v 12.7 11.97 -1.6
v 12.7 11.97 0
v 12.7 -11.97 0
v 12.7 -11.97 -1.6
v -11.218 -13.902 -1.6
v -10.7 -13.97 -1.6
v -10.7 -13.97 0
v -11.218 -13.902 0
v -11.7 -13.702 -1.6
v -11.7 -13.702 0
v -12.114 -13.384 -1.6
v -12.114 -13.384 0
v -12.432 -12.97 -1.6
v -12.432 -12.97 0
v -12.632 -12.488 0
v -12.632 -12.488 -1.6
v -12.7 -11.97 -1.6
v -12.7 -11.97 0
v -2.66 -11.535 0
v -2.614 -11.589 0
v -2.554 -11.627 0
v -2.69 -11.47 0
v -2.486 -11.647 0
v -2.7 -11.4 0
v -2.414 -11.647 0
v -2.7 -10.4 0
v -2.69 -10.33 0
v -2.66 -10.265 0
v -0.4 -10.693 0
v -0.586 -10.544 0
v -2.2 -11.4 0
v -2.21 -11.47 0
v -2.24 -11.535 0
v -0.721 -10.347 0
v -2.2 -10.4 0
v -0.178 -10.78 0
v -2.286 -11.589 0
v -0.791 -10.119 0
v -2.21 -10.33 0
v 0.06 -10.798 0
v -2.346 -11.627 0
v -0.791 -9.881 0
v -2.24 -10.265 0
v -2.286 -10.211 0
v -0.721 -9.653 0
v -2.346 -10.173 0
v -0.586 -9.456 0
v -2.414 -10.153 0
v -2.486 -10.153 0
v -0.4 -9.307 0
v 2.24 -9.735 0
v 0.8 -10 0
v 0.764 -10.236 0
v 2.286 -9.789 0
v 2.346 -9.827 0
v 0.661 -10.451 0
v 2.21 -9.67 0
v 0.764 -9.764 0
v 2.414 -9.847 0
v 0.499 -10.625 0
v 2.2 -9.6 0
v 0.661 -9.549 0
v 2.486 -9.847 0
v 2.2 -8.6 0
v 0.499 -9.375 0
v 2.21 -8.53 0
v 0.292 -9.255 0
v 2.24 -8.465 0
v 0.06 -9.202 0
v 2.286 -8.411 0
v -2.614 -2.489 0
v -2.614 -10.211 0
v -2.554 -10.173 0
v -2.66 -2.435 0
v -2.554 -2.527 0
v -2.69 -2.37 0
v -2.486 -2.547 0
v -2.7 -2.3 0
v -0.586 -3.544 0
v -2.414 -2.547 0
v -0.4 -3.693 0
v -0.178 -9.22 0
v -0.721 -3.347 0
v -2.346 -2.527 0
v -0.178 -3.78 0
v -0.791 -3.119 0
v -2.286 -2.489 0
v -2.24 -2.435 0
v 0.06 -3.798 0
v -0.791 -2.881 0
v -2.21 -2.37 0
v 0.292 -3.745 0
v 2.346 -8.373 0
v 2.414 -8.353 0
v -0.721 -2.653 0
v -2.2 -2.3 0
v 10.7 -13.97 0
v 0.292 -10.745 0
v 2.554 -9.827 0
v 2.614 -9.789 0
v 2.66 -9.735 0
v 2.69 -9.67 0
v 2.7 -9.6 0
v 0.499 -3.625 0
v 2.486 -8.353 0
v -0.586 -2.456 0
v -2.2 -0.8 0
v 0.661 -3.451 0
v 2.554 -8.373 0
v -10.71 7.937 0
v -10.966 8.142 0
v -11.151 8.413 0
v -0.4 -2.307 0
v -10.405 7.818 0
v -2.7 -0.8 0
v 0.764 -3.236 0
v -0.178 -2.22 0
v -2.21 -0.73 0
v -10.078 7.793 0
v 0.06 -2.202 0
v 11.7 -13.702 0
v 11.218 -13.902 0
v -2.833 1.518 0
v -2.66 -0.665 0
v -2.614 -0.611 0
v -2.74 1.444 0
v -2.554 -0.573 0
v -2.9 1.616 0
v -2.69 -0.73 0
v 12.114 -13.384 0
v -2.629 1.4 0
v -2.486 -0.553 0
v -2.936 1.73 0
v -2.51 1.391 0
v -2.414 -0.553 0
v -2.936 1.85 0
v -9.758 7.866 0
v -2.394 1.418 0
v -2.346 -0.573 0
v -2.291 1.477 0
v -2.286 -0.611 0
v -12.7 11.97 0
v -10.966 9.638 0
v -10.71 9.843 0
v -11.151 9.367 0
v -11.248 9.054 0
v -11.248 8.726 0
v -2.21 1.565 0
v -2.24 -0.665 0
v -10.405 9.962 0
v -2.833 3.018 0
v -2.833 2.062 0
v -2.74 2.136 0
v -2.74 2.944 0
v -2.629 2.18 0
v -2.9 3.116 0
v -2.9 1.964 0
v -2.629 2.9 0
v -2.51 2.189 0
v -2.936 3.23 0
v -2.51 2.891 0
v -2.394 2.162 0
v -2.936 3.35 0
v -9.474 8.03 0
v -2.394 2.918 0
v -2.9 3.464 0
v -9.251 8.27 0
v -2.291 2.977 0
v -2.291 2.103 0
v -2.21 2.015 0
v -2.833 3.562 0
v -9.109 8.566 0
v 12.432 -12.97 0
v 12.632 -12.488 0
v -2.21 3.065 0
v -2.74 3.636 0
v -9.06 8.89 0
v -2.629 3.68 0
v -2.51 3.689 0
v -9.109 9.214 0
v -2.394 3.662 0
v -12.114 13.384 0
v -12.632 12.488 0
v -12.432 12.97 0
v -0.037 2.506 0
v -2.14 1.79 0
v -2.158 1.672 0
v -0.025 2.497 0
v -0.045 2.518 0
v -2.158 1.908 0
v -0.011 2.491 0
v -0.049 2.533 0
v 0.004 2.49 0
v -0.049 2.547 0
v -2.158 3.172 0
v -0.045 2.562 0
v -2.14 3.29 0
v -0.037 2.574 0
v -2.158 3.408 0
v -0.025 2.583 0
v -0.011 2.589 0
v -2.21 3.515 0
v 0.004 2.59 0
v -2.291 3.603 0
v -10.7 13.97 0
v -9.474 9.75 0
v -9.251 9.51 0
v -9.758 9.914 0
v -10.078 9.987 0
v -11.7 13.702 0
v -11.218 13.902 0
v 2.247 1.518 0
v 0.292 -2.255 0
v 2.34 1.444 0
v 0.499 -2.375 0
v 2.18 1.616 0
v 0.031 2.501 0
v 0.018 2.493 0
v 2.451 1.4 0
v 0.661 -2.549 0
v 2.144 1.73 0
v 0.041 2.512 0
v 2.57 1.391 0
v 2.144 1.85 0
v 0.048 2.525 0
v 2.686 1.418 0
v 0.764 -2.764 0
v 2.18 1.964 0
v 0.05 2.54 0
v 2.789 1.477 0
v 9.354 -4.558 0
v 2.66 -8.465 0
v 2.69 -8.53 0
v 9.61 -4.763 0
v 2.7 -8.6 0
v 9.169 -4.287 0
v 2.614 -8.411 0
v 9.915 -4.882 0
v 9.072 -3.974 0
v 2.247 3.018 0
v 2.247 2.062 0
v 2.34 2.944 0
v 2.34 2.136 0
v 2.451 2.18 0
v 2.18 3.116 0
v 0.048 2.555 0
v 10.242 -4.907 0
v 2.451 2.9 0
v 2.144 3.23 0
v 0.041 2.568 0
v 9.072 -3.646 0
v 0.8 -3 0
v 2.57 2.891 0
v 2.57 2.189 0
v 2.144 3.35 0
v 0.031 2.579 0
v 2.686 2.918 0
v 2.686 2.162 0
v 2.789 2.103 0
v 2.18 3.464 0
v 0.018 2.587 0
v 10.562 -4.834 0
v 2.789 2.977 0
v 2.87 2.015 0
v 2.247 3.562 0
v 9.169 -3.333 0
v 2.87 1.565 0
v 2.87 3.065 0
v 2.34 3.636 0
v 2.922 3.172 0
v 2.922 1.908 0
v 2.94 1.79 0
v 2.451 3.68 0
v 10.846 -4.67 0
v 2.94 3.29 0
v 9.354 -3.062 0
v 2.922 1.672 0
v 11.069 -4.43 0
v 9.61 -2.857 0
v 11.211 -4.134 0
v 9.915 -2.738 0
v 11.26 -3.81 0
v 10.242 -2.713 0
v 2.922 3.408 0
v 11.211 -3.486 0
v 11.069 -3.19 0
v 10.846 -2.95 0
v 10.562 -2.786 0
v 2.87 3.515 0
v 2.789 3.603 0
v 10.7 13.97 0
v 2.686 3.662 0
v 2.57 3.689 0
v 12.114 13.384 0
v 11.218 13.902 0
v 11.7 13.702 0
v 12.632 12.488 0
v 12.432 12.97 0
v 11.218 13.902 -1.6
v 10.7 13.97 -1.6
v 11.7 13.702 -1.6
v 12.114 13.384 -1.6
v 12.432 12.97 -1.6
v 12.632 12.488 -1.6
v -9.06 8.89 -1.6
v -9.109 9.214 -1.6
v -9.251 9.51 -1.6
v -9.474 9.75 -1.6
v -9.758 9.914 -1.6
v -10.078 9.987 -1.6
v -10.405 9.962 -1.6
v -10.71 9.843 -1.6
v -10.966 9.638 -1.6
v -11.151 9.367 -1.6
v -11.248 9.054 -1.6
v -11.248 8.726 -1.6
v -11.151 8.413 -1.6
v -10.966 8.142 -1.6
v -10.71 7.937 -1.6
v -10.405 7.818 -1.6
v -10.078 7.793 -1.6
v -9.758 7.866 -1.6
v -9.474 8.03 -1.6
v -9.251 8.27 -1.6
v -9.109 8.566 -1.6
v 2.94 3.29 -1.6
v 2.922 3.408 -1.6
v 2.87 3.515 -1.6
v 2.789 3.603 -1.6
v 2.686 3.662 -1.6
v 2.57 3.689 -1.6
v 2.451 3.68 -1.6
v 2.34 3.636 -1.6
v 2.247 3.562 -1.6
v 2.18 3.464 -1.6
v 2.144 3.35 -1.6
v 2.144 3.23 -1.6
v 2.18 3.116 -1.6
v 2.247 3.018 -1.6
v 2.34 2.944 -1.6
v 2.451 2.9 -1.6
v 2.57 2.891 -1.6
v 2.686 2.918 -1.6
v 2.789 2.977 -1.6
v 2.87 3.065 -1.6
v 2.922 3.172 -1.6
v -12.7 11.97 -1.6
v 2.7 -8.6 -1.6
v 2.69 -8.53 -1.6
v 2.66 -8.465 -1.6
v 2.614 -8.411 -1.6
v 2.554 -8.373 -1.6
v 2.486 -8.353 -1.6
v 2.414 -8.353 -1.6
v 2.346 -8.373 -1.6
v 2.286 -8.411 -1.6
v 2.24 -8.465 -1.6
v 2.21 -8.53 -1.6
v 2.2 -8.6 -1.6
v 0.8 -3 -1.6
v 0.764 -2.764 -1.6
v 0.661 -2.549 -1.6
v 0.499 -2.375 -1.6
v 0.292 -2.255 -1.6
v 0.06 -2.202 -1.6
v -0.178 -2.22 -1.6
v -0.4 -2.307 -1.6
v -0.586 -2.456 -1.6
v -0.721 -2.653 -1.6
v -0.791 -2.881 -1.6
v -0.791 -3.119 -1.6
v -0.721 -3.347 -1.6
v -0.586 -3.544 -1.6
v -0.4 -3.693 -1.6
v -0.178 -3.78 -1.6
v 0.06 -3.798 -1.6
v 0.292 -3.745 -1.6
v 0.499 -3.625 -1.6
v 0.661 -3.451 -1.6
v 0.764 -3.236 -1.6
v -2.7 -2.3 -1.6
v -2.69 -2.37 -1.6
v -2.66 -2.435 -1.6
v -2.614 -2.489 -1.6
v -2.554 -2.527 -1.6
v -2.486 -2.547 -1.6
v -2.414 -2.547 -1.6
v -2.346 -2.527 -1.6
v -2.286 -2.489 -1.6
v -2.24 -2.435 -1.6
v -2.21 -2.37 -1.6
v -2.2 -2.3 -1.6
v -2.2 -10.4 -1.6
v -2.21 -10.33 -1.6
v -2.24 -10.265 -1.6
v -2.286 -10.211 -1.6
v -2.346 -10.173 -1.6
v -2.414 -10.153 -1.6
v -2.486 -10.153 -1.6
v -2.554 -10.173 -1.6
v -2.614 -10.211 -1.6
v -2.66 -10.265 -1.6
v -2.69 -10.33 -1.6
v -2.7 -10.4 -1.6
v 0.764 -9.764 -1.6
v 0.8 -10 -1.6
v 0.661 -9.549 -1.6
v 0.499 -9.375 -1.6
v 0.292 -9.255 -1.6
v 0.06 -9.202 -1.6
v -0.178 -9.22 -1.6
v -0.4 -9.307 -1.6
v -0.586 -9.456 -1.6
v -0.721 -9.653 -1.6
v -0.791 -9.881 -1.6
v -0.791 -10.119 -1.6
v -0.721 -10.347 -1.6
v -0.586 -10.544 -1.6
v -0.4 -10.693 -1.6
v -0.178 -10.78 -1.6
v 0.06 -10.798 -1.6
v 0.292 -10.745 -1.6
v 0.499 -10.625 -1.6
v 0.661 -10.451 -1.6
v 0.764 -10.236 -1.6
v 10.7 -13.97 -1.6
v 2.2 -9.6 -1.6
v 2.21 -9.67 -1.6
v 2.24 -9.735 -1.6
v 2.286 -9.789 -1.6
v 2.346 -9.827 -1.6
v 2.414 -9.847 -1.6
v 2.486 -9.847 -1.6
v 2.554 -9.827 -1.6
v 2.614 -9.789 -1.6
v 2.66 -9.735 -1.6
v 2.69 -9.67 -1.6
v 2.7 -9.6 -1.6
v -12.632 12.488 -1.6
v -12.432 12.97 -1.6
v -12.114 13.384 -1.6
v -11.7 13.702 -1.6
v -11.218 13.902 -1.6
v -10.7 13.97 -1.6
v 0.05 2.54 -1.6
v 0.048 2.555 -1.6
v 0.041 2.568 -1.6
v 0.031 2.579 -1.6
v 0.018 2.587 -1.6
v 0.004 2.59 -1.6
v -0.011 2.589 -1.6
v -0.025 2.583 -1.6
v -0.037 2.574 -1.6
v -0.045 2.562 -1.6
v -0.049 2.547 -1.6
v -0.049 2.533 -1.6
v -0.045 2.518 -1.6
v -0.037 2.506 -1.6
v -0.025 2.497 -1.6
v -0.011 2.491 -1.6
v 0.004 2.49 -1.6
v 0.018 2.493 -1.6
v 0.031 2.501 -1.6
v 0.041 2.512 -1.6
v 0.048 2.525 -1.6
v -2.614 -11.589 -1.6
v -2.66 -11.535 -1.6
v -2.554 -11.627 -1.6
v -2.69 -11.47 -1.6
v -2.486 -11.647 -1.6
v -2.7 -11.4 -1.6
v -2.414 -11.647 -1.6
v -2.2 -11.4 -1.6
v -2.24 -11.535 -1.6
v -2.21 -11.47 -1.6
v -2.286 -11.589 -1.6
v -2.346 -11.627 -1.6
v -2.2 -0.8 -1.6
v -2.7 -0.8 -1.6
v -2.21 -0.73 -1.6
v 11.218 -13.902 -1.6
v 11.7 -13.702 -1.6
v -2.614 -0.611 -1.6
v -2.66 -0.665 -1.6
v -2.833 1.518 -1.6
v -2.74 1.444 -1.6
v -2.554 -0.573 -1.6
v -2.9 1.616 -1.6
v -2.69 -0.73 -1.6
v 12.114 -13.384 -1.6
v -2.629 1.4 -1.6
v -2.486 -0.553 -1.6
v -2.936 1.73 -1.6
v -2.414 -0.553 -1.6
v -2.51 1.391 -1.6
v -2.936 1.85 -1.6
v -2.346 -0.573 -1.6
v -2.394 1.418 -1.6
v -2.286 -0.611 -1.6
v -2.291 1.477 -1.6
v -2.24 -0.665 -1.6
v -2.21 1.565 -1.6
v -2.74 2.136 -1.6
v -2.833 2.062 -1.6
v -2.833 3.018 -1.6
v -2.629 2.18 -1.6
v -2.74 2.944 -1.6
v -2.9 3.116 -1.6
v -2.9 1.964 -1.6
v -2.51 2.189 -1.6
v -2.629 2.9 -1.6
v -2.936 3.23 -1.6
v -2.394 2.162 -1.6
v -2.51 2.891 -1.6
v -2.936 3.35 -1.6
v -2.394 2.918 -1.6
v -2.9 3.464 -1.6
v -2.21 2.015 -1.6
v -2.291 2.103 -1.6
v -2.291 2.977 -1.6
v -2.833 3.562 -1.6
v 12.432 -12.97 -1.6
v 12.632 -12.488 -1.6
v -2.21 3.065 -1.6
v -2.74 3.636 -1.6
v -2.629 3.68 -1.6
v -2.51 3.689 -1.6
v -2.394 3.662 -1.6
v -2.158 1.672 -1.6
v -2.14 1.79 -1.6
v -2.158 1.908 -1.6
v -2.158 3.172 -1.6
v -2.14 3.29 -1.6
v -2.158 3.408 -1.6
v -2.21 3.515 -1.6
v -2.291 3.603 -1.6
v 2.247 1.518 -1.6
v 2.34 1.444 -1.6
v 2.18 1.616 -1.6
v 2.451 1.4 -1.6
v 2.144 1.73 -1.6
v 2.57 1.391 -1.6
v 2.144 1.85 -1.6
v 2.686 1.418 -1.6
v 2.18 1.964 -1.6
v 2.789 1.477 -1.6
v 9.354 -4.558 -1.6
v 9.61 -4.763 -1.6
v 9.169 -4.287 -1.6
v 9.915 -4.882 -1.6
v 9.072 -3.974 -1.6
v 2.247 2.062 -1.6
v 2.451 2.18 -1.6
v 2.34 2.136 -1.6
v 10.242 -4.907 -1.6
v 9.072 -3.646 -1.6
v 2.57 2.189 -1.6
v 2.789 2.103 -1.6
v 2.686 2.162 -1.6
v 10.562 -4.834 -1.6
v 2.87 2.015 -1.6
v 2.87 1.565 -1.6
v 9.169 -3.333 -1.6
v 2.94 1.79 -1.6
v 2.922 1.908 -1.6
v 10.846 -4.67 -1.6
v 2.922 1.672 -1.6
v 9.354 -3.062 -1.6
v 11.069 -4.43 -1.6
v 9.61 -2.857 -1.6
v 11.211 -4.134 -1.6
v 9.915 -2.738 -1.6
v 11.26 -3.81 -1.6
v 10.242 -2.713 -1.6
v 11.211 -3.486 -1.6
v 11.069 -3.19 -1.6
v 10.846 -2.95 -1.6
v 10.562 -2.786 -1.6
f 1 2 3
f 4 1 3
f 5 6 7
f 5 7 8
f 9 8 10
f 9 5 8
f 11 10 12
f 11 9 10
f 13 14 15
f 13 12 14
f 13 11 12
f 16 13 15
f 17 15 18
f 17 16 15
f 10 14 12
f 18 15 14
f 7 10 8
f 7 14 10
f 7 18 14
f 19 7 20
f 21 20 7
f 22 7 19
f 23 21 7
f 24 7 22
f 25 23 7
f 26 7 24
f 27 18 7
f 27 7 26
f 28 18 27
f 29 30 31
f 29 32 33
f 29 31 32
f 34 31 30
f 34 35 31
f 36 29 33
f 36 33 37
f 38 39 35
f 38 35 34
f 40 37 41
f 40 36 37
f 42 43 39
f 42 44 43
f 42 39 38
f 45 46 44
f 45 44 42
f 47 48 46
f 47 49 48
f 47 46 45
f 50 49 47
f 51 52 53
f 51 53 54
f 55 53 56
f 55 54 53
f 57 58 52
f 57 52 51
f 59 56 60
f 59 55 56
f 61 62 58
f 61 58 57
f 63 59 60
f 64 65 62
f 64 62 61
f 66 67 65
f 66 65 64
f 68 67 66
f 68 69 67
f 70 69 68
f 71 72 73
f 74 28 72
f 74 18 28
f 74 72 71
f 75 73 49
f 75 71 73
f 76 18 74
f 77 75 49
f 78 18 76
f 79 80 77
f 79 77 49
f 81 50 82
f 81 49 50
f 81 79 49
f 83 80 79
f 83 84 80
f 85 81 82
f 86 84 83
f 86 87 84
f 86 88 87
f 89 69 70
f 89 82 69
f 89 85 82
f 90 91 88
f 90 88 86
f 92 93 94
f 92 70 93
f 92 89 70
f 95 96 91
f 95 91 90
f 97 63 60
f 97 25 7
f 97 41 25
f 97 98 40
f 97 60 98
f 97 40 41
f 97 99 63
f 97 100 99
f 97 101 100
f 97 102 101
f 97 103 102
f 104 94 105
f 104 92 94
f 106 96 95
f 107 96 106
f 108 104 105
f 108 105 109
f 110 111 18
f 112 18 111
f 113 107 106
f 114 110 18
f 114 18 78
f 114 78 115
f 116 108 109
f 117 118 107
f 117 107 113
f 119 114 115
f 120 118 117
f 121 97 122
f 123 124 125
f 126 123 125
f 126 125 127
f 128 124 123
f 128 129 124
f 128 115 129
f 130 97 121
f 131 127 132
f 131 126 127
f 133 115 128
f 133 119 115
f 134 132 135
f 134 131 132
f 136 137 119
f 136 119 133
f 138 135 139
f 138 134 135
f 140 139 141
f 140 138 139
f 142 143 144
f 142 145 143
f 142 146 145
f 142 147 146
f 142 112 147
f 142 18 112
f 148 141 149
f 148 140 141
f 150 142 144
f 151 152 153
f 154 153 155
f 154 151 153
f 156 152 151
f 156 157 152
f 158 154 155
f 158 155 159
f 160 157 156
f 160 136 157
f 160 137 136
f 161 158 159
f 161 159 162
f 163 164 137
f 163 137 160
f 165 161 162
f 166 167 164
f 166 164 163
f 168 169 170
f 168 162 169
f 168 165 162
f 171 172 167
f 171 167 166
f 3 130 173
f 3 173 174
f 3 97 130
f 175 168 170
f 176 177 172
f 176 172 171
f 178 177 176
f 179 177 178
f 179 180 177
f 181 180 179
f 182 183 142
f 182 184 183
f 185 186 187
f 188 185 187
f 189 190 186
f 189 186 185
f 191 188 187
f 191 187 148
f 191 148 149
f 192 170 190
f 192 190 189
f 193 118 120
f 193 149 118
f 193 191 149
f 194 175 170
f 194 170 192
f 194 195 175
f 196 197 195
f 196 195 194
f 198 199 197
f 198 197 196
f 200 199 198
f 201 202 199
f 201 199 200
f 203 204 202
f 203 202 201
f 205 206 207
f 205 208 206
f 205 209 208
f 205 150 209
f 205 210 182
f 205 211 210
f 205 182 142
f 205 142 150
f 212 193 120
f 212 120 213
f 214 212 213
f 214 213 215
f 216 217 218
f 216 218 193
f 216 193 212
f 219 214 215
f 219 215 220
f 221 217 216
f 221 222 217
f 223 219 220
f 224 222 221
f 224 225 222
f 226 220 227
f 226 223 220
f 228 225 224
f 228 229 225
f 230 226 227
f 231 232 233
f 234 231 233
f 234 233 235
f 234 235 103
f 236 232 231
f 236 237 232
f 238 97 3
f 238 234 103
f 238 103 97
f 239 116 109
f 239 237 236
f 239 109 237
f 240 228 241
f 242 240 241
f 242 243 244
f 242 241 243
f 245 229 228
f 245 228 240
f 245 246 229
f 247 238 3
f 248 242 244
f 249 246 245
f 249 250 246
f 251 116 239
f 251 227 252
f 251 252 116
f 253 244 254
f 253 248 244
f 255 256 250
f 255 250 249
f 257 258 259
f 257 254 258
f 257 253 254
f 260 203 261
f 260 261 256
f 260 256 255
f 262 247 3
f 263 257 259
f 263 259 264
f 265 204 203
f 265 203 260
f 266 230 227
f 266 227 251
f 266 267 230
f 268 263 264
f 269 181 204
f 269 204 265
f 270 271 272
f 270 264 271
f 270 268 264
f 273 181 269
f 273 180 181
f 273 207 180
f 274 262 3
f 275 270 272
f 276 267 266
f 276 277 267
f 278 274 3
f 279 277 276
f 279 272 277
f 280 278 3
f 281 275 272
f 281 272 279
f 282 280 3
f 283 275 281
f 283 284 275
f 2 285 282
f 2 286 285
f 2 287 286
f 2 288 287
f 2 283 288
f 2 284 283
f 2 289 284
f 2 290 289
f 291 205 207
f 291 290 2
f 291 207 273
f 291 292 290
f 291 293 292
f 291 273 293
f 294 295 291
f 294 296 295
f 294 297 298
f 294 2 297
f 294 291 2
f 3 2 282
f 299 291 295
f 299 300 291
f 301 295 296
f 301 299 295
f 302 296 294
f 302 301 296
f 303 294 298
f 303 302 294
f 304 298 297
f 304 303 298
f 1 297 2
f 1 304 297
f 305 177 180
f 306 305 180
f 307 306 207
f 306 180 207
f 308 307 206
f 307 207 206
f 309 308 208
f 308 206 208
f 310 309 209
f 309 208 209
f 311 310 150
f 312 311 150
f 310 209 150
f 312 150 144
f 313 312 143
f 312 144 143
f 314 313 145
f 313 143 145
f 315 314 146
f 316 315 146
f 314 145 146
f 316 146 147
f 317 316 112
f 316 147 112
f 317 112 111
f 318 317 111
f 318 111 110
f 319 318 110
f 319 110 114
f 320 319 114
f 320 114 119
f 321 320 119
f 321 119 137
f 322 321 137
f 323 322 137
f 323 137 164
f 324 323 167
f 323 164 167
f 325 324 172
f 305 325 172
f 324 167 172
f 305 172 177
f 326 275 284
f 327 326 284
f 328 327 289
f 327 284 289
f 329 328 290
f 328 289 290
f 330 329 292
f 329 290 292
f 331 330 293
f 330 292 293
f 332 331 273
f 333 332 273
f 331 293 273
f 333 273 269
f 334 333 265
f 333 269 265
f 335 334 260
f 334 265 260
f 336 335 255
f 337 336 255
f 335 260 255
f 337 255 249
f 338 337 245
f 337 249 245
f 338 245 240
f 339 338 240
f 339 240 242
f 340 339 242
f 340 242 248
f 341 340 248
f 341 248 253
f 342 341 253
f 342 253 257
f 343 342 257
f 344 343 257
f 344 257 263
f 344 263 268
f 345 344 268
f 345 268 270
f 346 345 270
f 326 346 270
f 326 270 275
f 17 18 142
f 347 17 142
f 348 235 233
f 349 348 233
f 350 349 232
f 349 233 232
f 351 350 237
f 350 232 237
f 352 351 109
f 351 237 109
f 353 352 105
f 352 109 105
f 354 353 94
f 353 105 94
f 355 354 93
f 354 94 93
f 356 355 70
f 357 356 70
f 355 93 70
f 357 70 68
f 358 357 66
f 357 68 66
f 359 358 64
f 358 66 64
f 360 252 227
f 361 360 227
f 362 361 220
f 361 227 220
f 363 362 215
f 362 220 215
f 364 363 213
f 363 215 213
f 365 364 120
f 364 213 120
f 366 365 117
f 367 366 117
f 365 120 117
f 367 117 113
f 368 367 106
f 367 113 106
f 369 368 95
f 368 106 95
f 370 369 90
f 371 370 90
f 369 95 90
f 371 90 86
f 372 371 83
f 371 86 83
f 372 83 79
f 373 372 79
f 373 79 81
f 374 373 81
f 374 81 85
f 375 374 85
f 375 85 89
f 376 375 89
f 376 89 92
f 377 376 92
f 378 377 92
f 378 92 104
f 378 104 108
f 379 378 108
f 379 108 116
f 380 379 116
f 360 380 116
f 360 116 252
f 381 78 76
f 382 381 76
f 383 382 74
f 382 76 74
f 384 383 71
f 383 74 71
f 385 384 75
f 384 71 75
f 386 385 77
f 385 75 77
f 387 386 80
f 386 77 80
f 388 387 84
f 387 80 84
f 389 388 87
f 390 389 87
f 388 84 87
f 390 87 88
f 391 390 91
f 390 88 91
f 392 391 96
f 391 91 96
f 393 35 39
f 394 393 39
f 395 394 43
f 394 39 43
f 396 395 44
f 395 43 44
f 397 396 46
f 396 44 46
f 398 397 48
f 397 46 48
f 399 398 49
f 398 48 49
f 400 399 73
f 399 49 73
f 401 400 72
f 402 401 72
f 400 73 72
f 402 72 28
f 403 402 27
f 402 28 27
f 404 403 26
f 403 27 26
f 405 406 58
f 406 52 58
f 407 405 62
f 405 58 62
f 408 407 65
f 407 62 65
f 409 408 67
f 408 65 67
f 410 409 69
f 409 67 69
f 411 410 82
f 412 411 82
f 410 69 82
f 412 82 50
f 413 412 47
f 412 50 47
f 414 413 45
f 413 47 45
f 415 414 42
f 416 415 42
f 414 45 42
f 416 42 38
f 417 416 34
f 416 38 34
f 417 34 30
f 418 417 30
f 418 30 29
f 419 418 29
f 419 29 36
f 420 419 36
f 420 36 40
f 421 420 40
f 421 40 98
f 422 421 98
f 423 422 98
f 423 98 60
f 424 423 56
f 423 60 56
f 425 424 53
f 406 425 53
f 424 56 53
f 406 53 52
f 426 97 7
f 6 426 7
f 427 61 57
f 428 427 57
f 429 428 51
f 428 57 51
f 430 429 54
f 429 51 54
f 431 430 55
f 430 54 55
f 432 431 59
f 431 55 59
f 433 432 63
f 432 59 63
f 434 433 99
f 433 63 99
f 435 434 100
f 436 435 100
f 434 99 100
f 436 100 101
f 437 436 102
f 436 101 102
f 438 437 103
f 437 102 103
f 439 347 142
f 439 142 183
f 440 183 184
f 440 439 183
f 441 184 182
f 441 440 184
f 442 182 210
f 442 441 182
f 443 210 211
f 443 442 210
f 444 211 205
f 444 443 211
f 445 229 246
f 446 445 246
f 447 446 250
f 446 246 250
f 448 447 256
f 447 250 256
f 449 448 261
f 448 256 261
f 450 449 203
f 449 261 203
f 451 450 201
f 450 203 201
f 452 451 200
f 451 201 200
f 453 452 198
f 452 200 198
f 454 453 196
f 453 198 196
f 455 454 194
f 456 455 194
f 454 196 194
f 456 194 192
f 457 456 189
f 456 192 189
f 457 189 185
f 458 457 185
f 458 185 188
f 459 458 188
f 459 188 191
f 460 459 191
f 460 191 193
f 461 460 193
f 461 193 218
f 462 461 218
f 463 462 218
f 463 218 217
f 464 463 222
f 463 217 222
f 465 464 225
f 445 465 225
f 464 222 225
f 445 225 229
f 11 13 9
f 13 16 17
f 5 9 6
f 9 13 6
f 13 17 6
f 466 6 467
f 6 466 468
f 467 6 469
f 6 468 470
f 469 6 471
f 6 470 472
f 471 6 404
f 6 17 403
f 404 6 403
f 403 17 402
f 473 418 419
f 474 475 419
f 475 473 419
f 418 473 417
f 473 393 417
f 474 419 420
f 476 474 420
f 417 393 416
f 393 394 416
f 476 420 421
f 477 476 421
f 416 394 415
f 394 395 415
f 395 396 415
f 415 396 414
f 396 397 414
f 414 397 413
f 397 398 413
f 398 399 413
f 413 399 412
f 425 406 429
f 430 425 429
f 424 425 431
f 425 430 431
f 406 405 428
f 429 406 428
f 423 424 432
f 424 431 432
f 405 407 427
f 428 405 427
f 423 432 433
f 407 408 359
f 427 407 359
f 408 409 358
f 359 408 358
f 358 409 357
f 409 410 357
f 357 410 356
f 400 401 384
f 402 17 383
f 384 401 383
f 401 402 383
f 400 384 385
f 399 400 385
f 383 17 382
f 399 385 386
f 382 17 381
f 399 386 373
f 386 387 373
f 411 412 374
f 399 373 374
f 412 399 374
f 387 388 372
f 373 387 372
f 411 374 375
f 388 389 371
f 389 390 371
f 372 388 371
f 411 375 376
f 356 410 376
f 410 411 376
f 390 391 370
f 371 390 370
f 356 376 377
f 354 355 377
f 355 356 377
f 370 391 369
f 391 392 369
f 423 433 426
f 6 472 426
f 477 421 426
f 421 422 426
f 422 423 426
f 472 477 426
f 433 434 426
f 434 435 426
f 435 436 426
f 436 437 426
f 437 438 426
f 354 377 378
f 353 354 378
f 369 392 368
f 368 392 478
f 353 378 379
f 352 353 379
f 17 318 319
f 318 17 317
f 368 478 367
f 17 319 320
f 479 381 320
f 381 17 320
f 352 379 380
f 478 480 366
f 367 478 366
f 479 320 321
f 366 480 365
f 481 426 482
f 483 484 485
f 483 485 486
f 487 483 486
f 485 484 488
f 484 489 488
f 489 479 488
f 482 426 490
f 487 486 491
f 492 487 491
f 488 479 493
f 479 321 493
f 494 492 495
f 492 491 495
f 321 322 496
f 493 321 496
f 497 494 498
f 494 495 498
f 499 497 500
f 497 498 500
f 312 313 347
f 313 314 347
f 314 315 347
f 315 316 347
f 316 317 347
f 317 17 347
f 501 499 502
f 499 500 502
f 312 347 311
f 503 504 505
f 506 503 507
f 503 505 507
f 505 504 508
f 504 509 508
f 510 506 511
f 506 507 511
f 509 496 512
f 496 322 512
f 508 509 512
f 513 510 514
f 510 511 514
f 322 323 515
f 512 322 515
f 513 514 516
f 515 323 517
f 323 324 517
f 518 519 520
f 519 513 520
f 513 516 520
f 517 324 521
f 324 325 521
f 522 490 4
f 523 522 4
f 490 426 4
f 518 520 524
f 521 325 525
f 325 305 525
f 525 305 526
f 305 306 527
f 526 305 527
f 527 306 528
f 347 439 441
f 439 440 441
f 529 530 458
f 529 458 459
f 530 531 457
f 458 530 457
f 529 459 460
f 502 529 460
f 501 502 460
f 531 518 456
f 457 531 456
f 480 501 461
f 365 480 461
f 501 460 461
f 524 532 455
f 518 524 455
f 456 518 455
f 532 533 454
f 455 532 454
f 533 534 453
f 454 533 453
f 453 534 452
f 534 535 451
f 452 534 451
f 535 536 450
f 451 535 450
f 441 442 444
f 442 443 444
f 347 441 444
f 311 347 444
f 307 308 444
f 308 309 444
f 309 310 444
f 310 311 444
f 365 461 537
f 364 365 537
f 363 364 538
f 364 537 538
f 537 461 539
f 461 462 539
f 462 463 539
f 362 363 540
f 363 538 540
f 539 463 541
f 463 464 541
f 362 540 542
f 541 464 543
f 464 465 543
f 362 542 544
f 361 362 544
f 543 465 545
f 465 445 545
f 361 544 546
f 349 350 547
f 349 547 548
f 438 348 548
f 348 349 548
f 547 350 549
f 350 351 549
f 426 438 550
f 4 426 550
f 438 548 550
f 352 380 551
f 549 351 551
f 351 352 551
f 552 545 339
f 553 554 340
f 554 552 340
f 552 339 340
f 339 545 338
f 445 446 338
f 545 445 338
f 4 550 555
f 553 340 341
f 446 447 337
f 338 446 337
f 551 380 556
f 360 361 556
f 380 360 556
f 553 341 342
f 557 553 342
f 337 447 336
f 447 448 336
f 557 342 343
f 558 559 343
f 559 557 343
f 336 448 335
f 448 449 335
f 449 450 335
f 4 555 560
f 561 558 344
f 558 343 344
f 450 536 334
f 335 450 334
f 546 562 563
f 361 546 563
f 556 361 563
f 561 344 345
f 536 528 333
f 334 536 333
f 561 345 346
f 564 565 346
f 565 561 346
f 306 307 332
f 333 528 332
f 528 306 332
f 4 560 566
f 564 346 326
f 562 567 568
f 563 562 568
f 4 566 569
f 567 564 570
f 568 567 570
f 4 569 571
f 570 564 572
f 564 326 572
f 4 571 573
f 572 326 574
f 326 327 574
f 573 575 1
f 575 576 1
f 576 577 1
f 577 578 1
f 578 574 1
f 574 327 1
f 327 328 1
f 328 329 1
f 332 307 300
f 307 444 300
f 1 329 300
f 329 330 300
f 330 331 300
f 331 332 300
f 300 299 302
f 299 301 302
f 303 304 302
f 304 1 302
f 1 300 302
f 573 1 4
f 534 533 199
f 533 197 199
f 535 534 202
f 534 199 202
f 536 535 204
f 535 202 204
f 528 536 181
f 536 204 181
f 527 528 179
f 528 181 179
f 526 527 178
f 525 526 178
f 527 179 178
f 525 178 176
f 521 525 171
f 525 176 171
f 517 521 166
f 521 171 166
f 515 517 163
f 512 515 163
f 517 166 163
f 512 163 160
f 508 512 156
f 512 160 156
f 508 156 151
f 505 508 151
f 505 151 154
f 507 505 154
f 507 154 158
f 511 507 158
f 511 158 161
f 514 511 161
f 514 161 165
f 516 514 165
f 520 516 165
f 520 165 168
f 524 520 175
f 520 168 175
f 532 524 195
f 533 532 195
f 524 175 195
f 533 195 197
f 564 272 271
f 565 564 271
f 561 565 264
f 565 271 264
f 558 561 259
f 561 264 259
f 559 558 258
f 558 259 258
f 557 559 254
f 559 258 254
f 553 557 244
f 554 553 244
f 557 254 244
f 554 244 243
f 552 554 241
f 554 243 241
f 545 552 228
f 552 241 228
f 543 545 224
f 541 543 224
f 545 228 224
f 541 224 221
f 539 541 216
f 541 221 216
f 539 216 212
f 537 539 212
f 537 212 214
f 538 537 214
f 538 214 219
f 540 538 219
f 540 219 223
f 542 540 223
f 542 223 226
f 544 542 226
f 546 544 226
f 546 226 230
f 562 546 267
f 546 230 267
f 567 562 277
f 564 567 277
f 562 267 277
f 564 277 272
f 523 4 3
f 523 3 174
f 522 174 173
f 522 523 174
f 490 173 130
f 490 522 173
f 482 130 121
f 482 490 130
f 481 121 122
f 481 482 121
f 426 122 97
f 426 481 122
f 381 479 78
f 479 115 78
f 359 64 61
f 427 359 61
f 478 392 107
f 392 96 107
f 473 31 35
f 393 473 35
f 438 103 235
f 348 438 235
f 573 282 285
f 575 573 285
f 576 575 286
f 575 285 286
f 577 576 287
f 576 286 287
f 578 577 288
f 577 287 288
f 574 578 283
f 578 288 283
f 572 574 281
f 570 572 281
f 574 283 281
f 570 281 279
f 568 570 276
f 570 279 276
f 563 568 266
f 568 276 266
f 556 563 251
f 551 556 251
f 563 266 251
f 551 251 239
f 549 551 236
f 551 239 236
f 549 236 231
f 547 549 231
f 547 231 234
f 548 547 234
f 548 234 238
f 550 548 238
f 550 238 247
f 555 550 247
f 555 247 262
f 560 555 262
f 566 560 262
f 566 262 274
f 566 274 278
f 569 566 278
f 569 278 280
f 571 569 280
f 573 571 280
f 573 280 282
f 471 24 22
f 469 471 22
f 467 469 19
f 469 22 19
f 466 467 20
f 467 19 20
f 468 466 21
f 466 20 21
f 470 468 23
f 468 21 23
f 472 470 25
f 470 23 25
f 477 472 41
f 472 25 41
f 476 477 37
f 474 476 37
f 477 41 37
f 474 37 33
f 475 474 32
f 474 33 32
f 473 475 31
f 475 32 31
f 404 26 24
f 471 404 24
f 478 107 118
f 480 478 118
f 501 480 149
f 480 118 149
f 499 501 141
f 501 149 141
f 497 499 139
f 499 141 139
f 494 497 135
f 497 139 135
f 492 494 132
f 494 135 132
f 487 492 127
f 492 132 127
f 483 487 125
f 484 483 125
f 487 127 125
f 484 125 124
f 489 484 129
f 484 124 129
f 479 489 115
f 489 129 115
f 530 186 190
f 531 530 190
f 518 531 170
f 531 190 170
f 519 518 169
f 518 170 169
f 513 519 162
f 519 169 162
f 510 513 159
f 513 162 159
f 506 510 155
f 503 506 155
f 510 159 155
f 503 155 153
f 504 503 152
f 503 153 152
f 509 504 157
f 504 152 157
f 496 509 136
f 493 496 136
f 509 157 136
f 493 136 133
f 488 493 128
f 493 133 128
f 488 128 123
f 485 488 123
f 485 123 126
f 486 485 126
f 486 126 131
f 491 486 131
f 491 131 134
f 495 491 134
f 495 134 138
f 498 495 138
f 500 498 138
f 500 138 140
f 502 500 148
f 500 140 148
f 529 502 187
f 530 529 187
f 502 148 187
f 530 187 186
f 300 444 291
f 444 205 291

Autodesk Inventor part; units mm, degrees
ref_plane "YZ Plane" through (0, 0, 0) normal (1, 0, 0) x (0, 1, 0)
ref_plane "XZ Plane" through (0, 0, 0) normal (0, 1, 0) x (-1, 0, 0)
ref_plane "XY Plane" through (0, 0, 0) normal (0, 0, 1) x (1, 0, 0)
ref_plane "作業平面1" through (0, 0, 0) normal (0, 0, 1) x (1, 0, 0)
sketch "スケッチ1" plane through (0, 0, 0) normal (0, 0, 1) x (1, 0, 0)
  line L0 (-12.7, 11.83) -> (-12.7, 13.57) projected
  line L1 (-12.3, 13.97) -> (-10.56, 13.97) projected
  line L2 (12.3, -13.97) -> (10.56, -13.97) projected
  line L3 (12.7, -11.83) -> (12.7, -13.57) projected
  line L4 (-12.7, 13.97) -> (12.7, 13.97)
  line L5 (12.7, 13.97) -> (12.7, -13.97)
  line L6 (12.7, -13.97) -> (-12.7, -13.97)
  line L7 (-12.7, -13.97) -> (-12.7, 13.97)
  point P0 (0, 0)
extrude "押し出し1" add sketch "スケッチ1" against normal blind 1.6
sketch "スケッチ2" plane through (0, 0, 0) normal (0, 0, 1) x (1, 0, 0)
  circle A0 centre (-10.16, 8.89) radius 1.1
  circle A1 centre (10.16, -3.81) radius 1.1
  point P0 (0, 0)
  dimension "d2" = 2.2
  dimension "d3" = 2.2
  dimension "d4" = 10.16
  dimension "d5" = 8.89
  dimension "d6" = 3.81
  dimension "d7" = 10.16
extrude "押し出し2" cut sketch "スケッチ2" along normal mid plane 20
sketch "スケッチ3" plane through (0, 0, 0) normal (0, 0, 1) x (1, 0, 0)
  circle A0 centre (-2.54, 3.81) radius 0.4 projected
  circle A1 centre (-2.54, 1.27) radius 0.4 projected
  circle A2 centre (2.54, 3.81) radius 0.4 projected
  circle A3 centre (2.54, 1.27) radius 0.4 projected
  point P0 (0, 0)
extrude "押し出し3" cut sketch "スケッチ3" along normal mid plane 20
sketch "スケッチ4" plane through (0, 0, 0) normal (0, 0, 1) x (1, 0, 0)
  circle A0 centre (-2.54, 1.27) radius 0.4 projected
  circle A1 centre (-2.54, 3.81) radius 0.4 projected
  circle A2 centre (2.54, 1.27) radius 0.4 projected
  circle A3 centre (2.54, 3.81) radius 0.4 projected
  circle A4 centre (0, 2.54) radius 0.05
  line L0 (0, -30.1689) -> (0, 24.3248)
  point P0 (0, 0)
  dimension "d12" = 0.1
  dimension "d13" = 2.54
extrude "押し出し4" cut sketch "スケッチ4" against normal blind 20 contours A4 L0 | L0 A4
sketch "スケッチ5" plane through (0, 0, 0) normal (0, 0, 1) x (1, 0, 0)
  circle A0 centre (0, -3) radius 0.8
  circle A1 centre (0, -10) radius 0.8
  point P0 (0, 0)
  dimension "d16" = 1.6
  dimension "d17" = 1.6
  dimension "d18" = 3
  dimension "d19" = 7
extrude "押し出し5" cut sketch "スケッチ5" against normal blind 20
sketch "スケッチ6" plane through (0, 0, 0) normal (0, 0, 1) x (1, 0, 0)
  line L0 (-2.55, -1.3) -> (-2.35, -1.3) projected
  line L1 (-2.55, -1.3) -> (-2.55, -1.8) projected
  line L2 (-2.35, -1.8) -> (-2.55, -1.8) projected
  line L3 (-2.35, -1.8) -> (-2.35, -1.3) projected
  line L4 (2.55, -8.6) -> (2.55, -9.6) projected
  line L5 (2.35, -9.6) -> (2.35, -8.6) projected
  line L6 (-2.35, -10.4) -> (-2.35, -11.4) projected
  circle A0 centre (0, -3) radius 0.8 projected
  circle A1 centre (0, -10) radius 0.8 projected
  circle A2 centre (0, 2.54) radius 0.05 projected
  circle A3 centre (2.54, 3.81) radius 0.4 projected
  circle A4 centre (-2.54, 3.81) radius 0.4 projected
  circle A5 centre (-2.54, 1.27) radius 0.4 projected
  circle A6 centre (2.54, 1.27) radius 0.4 projected
  circle A7 centre (-10.16, 8.89) radius 1.1 projected
  circle A8 centre (10.16, -3.81) radius 1.1 projected
  line L7 (-12.7, 13.97) -> (12.7, 13.97) projected
  line L8 (-12.7, -13.97) -> (-12.7, 13.97) projected
  line L9 (12.7, -13.97) -> (-12.7, -13.97) projected
  line L10 (12.7, 13.97) -> (12.7, -13.97) projected
  line L11 (-2.55, -11.4) -> (-2.55, -10.4) projected
  line L12 (-2.35, -1.8) -> (-2.35, -2.3) projected
  line L13 (-2.55, -2.3) -> (-2.55, -1.8) projected
  line L14 (-2.35, -0.8) -> (-2.35, -1.3) projected
  line L15 (-2.55, -1.3) -> (-2.55, -0.8) projected
  line L16 (-2.55, -1.3) -> (-2.35, -1.8)
  line L17 (2.35, -8.6) -> (2.55, -9.6)
  line L18 (-2.55, -10.4) -> (-2.35, -11.4)
  line L19 (-2.55, -0.8) -> (-2.35, -0.8)
  line L20 (-2.55, -2.3) -> (-2.35, -2.3)
  line L21 (2.35, -8.6) -> (2.55, -8.6)
  line L22 (2.55, -9.6) -> (2.35, -9.6)
  line L23 (-2.55, -10.4) -> (-2.35, -10.4)
  line L24 (-2.55, -11.4) -> (-2.35, -11.4)
  line L25 (-2.45, -2.3) -> (-2.45, -0.8) construction
  line L26 (-2.2, -2.3) -> (-2.2, -0.8)
  line L27 (-2.7, -0.8) -> (-2.7, -2.3)
  arc A9 (-2.7, -2.3) -> (-2.2, -2.3) centre (-2.45, -2.3) ccw
  arc A10 (-2.2, -0.8) -> (-2.7, -0.8) centre (-2.45, -0.8) ccw
  line L28 (2.45, -9.6) -> (2.45, -8.6) construction
  line L29 (2.7, -9.6) -> (2.7, -8.6)
  line L30 (2.2, -8.6) -> (2.2, -9.6)
  arc A11 (2.2, -9.6) -> (2.7, -9.6) centre (2.45, -9.6) ccw
  arc A12 (2.7, -8.6) -> (2.2, -8.6) centre (2.45, -8.6) ccw
  line L31 (-2.45, -11.4) -> (-2.45, -10.4) construction
  line L32 (-2.2, -11.4) -> (-2.2, -10.4)
  line L33 (-2.7, -10.4) -> (-2.7, -11.4)
  arc A13 (-2.7, -11.4) -> (-2.2, -11.4) centre (-2.45, -11.4) ccw
  arc A14 (-2.2, -10.4) -> (-2.7, -10.4) centre (-2.45, -10.4) ccw
  point P0 (0, 0)
  point P1 (-2.45, -1.55)
  point P2 (2.45, -9.1)
  point P3 (-2.45, -10.9)
  dimension "d22" = 0.2
  dimension "d23" = 0.5
  dimension "d24" = 0.5
  dimension "d25" = 0.5
extrude "押し出し6" cut sketch "スケッチ6" against normal blind 2 contours L15 L19 L14 L0 | L16 L2 L1 | L0 L3 L16 | L2 L12 L20 L13 | L4 L17 L21 | L22 L5 L17 | L6 L18 L23 | L24 L11 L18 | A9 L27 A10 L26 | A11 L30 A12 L29 | A13 L33 A14 L32
fillet "フィレット1" radius 2 4 edges at (-12.7, -13.97, -0.8) (12.7, -13.97, -0.8) (12.7, 13.97, -0.8) (-12.7, 13.97, -0.8)
move faces "移動1" translate (0, 0.52, 0) faces at (-2.1452, 1.2058, -0.5333) (2.9348, 1.2058, -0.5333)
move faces "移動2" translate (0, -0.52, 0) faces at (-2.1452, 3.7458, -0.5333) (2.9348, 3.7458, -0.5333)
properties part number "HbSensorBoard01"
